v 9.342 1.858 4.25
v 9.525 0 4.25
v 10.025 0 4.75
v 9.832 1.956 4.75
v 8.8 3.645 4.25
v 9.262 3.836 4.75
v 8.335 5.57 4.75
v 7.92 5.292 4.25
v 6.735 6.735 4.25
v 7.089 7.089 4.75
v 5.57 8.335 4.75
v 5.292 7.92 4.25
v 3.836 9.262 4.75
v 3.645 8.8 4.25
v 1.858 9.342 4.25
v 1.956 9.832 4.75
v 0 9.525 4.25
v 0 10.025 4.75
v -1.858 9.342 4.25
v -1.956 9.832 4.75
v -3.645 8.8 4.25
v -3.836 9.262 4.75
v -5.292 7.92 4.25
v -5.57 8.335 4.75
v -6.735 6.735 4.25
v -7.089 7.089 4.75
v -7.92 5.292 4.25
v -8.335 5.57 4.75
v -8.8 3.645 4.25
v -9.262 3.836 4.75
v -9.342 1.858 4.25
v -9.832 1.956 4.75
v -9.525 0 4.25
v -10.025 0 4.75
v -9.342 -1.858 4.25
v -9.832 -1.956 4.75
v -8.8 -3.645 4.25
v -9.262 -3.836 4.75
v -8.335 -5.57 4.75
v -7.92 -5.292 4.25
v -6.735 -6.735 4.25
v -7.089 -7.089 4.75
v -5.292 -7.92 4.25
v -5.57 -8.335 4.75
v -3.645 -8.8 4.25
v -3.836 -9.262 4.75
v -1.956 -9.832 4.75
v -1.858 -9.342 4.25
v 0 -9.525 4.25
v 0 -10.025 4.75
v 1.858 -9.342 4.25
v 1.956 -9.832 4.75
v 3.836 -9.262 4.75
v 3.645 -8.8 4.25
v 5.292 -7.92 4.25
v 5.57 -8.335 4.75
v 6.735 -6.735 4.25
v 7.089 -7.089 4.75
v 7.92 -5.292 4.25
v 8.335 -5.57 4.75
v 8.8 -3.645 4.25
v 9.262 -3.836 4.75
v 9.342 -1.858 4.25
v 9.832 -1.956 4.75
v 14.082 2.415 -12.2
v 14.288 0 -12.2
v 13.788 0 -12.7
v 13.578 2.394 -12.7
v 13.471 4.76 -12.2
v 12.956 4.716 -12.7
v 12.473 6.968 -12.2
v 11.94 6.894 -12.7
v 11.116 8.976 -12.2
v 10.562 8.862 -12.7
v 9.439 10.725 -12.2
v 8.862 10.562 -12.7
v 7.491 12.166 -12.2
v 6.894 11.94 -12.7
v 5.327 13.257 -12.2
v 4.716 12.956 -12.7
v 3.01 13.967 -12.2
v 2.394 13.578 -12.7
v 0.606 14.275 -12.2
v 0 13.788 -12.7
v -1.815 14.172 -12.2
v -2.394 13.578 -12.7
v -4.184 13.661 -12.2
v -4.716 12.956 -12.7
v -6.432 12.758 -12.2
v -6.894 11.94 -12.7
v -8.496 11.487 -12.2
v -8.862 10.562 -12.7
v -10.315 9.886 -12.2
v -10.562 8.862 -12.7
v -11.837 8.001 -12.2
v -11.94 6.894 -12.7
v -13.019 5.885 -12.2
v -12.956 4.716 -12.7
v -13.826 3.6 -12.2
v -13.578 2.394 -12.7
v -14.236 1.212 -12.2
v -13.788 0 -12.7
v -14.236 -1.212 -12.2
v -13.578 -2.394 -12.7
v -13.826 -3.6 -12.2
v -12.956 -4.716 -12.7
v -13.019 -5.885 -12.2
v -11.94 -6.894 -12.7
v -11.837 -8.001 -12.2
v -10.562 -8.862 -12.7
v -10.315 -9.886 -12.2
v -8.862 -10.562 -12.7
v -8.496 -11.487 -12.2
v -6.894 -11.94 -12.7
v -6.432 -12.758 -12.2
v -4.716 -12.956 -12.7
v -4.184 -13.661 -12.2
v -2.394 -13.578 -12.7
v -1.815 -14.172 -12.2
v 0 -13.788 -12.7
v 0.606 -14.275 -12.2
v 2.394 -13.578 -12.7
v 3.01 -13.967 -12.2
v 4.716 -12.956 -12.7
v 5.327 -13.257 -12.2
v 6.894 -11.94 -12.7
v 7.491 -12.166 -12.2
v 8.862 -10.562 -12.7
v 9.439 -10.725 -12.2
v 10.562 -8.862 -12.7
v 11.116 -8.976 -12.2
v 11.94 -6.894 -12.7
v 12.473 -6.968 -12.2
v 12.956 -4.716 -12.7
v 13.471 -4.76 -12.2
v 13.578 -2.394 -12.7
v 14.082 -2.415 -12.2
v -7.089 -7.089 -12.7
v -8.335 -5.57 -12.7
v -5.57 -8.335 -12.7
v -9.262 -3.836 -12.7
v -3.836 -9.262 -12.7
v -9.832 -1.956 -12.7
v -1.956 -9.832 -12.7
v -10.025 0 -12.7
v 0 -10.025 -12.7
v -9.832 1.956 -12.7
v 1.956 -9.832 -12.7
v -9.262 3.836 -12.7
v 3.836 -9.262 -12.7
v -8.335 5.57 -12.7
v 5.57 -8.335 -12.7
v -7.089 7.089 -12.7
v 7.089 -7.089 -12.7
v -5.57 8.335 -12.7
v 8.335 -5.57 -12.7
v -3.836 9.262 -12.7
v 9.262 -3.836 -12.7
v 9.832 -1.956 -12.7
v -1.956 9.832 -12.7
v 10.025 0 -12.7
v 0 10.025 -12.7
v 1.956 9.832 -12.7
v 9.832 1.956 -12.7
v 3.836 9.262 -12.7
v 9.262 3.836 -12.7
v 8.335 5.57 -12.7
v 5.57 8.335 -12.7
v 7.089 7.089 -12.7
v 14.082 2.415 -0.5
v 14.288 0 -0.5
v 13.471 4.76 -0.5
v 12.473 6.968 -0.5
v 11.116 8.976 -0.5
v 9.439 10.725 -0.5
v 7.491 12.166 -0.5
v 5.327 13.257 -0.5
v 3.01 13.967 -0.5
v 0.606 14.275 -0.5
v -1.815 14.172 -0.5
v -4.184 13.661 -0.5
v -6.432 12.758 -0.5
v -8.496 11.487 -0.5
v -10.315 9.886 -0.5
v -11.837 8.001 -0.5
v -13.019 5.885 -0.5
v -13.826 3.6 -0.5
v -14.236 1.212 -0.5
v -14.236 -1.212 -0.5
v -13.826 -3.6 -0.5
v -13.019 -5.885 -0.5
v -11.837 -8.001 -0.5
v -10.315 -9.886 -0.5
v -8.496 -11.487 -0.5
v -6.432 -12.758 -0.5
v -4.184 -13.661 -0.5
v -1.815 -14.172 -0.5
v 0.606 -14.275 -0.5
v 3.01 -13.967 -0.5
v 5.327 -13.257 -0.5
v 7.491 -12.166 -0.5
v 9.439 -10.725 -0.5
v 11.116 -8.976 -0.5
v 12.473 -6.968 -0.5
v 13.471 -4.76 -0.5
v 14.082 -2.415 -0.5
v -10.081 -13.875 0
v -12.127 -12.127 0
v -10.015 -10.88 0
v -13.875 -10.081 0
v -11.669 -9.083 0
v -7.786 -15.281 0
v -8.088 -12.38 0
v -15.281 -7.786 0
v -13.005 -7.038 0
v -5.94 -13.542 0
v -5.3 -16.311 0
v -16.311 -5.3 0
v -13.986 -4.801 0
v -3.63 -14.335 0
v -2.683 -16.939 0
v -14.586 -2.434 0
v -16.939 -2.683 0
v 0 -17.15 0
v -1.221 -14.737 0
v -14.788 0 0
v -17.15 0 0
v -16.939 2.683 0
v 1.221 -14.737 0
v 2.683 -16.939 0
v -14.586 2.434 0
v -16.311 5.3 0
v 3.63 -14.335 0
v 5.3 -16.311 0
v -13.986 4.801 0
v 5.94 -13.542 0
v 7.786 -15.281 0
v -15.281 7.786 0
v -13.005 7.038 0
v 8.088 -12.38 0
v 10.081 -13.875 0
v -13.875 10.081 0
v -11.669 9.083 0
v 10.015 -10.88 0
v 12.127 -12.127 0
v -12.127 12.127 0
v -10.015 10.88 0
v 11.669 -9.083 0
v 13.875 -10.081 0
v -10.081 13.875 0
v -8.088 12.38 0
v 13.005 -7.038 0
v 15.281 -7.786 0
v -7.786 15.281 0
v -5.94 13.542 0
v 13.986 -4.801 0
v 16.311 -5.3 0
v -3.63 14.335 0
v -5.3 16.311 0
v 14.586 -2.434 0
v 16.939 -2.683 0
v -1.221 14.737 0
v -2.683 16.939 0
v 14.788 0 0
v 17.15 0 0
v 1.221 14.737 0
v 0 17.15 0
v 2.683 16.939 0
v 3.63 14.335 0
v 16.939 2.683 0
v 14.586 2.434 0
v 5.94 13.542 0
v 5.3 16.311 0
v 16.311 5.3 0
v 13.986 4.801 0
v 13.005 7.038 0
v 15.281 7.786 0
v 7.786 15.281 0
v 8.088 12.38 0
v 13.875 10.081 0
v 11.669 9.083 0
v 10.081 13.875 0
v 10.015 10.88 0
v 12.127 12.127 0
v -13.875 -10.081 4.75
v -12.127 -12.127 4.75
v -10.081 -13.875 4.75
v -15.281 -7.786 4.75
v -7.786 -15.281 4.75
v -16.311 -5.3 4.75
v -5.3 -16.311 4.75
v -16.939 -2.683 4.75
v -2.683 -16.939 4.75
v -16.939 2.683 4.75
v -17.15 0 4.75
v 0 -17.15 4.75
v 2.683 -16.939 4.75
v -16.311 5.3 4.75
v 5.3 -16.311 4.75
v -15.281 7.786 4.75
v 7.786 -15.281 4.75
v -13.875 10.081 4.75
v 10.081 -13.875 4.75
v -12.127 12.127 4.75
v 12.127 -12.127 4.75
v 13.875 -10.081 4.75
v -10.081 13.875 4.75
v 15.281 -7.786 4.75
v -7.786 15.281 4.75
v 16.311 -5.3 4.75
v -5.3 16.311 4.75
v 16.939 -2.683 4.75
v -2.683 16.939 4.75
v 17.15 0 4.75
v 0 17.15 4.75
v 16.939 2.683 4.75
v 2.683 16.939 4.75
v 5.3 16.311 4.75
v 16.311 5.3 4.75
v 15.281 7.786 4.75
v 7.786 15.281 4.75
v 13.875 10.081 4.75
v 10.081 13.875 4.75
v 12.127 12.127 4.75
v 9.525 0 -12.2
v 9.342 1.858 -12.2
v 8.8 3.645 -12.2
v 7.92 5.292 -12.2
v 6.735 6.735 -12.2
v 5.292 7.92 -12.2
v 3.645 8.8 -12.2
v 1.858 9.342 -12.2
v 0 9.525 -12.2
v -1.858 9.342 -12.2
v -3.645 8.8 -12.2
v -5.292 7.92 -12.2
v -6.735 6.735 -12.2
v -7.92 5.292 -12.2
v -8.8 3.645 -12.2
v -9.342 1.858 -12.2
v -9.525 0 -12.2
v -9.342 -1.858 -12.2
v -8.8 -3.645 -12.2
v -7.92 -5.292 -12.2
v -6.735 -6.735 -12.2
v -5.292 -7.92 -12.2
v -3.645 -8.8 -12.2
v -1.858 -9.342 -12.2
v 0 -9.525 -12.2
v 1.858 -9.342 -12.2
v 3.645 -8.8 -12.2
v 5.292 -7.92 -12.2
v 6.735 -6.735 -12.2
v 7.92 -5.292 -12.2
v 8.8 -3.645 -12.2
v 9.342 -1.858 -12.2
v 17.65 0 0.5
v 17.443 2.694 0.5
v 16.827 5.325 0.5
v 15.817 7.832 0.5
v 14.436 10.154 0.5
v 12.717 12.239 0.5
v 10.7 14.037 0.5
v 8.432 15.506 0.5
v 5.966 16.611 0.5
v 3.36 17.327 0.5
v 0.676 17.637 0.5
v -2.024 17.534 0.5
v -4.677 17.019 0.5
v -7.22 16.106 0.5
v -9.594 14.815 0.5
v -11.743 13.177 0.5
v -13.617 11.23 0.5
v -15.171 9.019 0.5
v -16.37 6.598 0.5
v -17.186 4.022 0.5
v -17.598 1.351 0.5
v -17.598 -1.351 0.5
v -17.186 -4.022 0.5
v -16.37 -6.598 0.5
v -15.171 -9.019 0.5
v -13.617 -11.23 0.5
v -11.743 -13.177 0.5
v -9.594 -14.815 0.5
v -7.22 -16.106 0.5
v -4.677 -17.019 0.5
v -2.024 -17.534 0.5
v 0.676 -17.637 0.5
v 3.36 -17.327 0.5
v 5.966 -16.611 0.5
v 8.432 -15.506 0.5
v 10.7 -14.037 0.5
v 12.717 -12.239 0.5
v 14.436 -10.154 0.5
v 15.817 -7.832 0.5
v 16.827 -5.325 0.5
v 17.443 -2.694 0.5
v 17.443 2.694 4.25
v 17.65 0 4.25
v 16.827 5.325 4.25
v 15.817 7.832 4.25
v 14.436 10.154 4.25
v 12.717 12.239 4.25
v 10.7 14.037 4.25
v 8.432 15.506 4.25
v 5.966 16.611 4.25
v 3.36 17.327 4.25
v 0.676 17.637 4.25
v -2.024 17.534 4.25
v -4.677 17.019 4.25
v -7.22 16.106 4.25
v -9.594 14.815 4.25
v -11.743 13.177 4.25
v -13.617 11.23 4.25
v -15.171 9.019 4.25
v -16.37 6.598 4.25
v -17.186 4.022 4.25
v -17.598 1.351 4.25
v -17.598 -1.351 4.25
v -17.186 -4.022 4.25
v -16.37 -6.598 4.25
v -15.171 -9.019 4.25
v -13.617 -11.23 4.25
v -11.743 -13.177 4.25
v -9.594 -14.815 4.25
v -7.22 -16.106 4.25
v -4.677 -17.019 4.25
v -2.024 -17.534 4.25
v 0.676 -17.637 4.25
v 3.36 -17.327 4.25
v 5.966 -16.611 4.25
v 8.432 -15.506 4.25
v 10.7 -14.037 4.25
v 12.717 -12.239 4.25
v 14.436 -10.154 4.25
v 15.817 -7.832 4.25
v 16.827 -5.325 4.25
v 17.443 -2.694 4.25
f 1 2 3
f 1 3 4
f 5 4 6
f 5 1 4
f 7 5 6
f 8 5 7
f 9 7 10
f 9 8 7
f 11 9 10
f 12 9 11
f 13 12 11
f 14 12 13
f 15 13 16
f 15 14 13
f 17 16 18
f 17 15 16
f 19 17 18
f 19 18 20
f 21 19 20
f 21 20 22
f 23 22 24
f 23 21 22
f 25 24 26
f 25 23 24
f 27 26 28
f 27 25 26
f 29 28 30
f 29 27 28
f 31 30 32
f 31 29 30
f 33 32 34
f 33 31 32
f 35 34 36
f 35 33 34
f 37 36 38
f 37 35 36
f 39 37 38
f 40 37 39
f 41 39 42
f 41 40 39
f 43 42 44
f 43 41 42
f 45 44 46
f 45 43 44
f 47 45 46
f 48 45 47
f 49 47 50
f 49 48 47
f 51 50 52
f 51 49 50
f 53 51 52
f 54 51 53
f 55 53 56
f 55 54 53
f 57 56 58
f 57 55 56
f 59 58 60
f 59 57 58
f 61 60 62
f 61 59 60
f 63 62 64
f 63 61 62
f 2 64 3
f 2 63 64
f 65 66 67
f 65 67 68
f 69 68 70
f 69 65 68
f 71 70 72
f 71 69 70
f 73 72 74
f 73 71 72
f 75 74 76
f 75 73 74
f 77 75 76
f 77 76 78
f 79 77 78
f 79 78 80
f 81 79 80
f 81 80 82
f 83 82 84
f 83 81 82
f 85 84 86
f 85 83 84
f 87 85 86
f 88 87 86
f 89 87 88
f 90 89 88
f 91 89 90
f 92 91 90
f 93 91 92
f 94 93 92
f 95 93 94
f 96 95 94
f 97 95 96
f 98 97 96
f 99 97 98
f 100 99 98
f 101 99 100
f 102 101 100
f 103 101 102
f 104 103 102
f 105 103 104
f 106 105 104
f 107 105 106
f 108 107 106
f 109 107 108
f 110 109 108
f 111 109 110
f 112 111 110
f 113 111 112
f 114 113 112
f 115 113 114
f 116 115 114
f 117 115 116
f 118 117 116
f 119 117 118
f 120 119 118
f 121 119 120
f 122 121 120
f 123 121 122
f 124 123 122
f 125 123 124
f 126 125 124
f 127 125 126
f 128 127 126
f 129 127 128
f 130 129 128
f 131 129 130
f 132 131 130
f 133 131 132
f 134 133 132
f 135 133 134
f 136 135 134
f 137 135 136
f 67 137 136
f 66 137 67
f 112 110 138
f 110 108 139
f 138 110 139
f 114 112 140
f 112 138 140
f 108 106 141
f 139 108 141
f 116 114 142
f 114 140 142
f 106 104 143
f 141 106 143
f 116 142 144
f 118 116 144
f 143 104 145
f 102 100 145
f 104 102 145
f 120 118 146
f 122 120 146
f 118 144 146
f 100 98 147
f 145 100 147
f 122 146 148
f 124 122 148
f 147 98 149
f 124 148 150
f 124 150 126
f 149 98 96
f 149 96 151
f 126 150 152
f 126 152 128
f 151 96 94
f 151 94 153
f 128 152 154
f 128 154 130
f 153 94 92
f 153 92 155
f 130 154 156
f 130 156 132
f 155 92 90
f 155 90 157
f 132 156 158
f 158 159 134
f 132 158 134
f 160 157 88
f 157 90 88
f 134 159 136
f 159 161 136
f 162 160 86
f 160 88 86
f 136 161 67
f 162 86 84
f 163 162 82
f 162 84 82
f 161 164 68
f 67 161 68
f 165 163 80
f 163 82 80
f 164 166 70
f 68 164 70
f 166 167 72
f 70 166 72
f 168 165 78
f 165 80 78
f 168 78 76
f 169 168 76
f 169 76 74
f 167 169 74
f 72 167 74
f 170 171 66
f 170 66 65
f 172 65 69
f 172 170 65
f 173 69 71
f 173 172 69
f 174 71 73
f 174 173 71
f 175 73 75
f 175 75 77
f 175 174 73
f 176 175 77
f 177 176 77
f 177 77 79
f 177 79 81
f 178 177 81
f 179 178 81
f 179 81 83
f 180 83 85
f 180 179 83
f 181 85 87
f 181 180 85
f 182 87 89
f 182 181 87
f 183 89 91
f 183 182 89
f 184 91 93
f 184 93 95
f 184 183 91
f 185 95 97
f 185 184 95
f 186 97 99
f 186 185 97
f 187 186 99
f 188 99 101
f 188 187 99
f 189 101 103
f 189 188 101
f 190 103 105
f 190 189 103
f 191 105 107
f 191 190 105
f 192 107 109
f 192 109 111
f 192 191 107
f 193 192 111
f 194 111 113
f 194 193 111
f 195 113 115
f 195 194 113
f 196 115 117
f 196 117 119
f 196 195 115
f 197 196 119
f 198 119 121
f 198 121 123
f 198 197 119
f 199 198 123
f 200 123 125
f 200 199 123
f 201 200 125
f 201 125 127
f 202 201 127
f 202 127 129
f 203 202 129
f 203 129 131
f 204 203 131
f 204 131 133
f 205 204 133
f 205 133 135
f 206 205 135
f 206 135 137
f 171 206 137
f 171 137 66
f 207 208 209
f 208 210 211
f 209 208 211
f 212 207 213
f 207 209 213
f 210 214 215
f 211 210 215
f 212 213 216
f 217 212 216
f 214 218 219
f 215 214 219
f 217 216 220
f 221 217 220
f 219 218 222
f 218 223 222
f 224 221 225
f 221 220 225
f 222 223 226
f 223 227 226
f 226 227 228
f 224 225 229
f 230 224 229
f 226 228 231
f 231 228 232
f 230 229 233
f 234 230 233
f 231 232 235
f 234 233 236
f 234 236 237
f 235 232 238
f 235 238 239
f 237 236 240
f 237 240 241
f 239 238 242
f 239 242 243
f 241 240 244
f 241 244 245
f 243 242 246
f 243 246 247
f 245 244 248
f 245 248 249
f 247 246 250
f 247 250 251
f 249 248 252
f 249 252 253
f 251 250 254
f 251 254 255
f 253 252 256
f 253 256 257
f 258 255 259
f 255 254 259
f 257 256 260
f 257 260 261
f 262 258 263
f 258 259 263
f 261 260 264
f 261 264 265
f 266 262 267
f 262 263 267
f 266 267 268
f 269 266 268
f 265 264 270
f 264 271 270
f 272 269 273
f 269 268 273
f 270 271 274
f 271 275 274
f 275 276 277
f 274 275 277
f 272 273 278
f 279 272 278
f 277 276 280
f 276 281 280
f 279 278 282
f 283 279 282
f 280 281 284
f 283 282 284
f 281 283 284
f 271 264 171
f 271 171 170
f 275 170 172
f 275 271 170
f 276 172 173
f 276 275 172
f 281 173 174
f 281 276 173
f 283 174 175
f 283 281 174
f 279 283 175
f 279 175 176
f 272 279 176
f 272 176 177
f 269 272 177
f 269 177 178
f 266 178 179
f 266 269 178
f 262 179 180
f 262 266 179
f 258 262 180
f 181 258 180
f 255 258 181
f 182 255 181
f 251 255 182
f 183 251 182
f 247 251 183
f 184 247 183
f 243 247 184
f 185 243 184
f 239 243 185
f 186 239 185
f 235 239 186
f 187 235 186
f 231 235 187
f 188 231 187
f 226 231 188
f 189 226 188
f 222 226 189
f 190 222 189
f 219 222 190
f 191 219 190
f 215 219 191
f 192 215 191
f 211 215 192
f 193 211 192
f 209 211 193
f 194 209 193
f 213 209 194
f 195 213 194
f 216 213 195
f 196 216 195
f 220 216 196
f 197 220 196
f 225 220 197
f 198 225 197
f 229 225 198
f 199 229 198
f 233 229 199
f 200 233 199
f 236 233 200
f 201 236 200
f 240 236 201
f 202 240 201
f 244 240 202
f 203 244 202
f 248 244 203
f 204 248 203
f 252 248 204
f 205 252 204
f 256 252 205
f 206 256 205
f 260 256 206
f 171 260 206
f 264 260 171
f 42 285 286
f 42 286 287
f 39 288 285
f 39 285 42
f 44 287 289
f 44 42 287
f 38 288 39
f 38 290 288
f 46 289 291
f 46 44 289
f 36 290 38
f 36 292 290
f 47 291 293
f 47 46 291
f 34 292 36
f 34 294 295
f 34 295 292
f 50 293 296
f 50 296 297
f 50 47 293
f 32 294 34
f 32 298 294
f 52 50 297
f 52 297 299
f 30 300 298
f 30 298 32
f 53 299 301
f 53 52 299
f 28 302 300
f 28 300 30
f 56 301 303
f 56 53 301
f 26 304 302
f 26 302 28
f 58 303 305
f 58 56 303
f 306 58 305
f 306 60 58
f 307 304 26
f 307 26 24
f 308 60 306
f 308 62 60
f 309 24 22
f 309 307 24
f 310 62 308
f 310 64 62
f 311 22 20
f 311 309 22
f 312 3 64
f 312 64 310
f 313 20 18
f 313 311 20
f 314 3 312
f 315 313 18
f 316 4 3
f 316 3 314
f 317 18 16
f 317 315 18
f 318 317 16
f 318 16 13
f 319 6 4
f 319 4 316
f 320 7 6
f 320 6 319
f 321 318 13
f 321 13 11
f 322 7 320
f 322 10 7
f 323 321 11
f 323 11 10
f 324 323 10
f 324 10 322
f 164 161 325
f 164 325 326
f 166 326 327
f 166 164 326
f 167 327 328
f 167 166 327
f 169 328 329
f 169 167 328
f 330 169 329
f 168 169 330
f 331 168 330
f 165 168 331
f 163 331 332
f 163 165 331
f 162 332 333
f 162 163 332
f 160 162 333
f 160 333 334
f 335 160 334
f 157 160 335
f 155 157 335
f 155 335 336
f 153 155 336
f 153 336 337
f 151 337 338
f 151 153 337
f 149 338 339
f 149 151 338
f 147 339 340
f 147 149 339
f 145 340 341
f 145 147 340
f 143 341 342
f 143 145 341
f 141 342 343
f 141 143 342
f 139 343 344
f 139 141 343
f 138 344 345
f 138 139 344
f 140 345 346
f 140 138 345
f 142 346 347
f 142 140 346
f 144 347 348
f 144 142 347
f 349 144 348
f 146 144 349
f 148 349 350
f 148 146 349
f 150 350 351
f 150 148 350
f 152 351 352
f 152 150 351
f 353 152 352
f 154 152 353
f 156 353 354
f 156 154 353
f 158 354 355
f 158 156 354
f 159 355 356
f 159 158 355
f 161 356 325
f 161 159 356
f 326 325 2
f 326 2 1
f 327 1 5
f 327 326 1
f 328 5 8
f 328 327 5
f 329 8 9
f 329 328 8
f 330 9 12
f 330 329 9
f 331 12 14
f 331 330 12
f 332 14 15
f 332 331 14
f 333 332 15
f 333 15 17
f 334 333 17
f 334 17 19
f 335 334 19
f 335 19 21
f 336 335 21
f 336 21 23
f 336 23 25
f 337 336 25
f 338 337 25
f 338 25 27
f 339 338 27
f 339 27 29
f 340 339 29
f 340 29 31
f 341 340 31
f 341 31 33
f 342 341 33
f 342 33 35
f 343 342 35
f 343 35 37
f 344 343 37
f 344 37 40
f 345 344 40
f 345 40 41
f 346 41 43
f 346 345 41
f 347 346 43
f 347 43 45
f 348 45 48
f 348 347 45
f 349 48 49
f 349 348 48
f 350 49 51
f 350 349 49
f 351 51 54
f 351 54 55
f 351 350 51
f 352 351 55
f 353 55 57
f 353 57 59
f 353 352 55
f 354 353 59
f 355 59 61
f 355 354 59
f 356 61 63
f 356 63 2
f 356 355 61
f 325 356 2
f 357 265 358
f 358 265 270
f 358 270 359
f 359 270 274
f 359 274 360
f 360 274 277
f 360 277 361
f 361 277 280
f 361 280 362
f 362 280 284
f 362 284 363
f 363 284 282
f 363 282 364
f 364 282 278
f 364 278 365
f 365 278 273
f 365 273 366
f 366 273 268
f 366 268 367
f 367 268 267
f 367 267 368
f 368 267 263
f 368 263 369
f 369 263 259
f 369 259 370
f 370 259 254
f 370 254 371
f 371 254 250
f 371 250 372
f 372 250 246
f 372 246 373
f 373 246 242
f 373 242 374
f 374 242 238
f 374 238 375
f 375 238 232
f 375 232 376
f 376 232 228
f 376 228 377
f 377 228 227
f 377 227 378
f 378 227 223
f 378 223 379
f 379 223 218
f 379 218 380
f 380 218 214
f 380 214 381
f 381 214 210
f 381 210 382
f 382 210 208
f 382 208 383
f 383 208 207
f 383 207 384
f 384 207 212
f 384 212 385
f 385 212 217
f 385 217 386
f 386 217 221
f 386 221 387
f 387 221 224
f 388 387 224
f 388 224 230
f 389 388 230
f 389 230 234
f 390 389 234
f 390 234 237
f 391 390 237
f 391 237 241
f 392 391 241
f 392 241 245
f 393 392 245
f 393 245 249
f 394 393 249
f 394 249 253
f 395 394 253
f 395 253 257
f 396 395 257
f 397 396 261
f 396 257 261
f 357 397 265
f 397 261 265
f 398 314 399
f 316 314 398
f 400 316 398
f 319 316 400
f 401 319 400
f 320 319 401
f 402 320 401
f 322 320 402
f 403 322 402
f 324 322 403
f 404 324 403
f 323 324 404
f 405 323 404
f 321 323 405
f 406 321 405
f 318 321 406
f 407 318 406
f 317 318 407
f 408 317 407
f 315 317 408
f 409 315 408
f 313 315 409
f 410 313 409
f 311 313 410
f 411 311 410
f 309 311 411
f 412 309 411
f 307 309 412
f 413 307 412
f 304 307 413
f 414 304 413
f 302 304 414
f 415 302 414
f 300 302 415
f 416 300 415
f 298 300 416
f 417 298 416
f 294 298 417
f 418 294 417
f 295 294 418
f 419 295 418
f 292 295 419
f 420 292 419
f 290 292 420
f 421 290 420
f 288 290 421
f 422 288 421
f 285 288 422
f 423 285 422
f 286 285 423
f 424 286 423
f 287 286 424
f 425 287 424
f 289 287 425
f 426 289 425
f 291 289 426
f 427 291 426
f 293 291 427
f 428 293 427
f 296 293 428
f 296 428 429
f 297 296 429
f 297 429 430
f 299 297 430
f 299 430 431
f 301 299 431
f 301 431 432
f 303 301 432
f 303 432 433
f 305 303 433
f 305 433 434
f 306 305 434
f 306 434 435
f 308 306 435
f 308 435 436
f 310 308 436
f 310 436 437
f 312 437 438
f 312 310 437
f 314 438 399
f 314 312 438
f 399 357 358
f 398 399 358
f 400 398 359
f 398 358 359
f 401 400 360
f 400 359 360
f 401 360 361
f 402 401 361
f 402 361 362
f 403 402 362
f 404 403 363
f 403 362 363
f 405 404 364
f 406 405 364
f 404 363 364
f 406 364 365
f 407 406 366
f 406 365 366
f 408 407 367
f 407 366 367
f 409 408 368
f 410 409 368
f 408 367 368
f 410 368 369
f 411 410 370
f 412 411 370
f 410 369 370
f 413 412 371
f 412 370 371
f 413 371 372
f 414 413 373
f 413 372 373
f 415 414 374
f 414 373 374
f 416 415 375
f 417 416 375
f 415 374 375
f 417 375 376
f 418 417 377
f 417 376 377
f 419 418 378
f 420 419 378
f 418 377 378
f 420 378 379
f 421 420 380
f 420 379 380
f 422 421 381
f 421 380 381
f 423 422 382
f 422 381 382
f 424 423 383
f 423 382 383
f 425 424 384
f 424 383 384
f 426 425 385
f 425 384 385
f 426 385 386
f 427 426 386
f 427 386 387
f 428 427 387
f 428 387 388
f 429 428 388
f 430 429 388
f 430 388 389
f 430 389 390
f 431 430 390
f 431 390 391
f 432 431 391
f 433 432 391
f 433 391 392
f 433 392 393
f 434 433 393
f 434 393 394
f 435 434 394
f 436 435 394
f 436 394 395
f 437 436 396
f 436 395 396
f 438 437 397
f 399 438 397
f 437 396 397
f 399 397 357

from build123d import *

# Parameters (mm, degrees)
F0_R     = 14.2875
F0_R_2   = 9.525
F1_DEPTH = 12.7
F2_R     = 17.65
F2_R_2   = 9.525
F3_DEPTH = 4.75
F4_SIZE  = 0.5


with BuildPart() as f1:
    # F0 (on Top) → F1 (new body)
    with BuildSketch(Plane.XY):
        Circle(F0_R)
        Circle(F0_R_2, mode=Mode.SUBTRACT)
    extrude(amount=-F1_DEPTH)

    # F2 (on Top) → F3 (join)
    with BuildSketch(Plane.XY):
        Circle(F2_R)
        Circle(F2_R_2, mode=Mode.SUBTRACT)
    extrude(amount=F3_DEPTH)

    # F4
    f4_edges = [f1.edges().sort_by_distance(p)[0] for p in [
        (17.65, 0, 2.375),
        (-17.65, 0, 0),
        (-17.65, 0, 4.75),
        (9.525, 0, -6.35),
        (-9.525, 0, 0),
        (-9.525, 0, -12.7),
        (14.2875, 0, -6.35),
        (-14.2875, 0, 0),
        (-14.2875, 0, -12.7),
    ]]
    chamfer(f4_edges, length=F4_SIZE)


solid = f1.part
